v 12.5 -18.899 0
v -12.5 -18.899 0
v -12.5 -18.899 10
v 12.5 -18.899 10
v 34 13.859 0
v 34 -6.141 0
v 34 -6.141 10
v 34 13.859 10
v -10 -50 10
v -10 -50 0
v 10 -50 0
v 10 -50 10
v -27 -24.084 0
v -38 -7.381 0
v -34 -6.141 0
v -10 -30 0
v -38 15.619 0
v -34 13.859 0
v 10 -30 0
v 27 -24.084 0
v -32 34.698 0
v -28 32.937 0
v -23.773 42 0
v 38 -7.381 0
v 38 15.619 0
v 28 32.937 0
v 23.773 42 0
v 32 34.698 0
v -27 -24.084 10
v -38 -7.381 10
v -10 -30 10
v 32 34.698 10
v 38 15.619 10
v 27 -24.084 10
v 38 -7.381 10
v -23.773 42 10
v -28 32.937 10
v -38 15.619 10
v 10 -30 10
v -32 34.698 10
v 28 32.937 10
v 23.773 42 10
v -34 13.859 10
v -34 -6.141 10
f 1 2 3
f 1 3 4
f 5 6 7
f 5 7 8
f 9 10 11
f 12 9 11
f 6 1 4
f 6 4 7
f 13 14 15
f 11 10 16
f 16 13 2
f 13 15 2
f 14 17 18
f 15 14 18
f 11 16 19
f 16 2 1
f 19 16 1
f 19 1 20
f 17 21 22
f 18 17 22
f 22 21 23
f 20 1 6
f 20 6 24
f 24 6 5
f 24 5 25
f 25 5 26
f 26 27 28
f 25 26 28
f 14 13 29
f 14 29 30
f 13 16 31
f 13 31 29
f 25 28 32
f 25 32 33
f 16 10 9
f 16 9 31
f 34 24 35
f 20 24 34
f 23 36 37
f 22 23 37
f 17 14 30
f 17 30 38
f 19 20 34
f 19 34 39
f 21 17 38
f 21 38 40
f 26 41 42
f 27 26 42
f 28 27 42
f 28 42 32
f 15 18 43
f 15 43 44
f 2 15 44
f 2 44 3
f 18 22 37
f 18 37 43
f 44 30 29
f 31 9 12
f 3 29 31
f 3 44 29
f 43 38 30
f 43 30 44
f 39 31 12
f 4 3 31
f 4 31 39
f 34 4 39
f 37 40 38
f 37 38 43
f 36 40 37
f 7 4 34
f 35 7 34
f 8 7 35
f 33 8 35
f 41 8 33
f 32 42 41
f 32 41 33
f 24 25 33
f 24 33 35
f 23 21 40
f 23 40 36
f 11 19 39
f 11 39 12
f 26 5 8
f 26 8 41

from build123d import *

# Parameters (mm, degrees)
ESQUISSE1_W             = 80
ESQUISSE1_H             = 100
BOSS_EXTRU_1_DEPTH      = 10
ENL_V_START             = -10
ENL_V_MAT_EXTRU_2_DEPTH = 10


# Read off the part's stored shape, not the designer's step: Enlèv. mat.-Extru.2
with BuildPart() as part:
    # Esquisse1 → Boss.-Extru.1 (new body)
    with BuildSketch(Plane.XY):
        Rectangle(ESQUISSE1_W, ESQUISSE1_H)
    extrude(amount=BOSS_EXTRU_1_DEPTH)

    # Enlèv. mat.-Extru.2 outline → Enlèv. mat.-Extru.2 (cut)
    with BuildSketch(Plane.XY.offset(10).offset(ENL_V_START)):
        Polygon((-40, -50), (-10, -50), (-10, -30), (-27, -24.083920217), (-38, -7.380627128), (-38, 15.619372872), (-32, 34.6981569), (-23.773026842, 42), (-28, 32.937290807), (-34, 13.858506778), (-34, -6.141493222), (-12.5, -18.898844044), (12.5, -18.898844044), (34, -6.141493222), (34, 13.858506778), (28, 32.937290807), (23.773026842, 42), (32, 34.6981569), (38, 15.619372872), (38, -7.380627128), (27, -24.083920217), (10, -30), (10, -50), (40, -50), (40, 50), (-40, 50), align=None)
    extrude(amount=ENL_V_MAT_EXTRU_2_DEPTH, mode=Mode.SUBTRACT)


solid = part.part
